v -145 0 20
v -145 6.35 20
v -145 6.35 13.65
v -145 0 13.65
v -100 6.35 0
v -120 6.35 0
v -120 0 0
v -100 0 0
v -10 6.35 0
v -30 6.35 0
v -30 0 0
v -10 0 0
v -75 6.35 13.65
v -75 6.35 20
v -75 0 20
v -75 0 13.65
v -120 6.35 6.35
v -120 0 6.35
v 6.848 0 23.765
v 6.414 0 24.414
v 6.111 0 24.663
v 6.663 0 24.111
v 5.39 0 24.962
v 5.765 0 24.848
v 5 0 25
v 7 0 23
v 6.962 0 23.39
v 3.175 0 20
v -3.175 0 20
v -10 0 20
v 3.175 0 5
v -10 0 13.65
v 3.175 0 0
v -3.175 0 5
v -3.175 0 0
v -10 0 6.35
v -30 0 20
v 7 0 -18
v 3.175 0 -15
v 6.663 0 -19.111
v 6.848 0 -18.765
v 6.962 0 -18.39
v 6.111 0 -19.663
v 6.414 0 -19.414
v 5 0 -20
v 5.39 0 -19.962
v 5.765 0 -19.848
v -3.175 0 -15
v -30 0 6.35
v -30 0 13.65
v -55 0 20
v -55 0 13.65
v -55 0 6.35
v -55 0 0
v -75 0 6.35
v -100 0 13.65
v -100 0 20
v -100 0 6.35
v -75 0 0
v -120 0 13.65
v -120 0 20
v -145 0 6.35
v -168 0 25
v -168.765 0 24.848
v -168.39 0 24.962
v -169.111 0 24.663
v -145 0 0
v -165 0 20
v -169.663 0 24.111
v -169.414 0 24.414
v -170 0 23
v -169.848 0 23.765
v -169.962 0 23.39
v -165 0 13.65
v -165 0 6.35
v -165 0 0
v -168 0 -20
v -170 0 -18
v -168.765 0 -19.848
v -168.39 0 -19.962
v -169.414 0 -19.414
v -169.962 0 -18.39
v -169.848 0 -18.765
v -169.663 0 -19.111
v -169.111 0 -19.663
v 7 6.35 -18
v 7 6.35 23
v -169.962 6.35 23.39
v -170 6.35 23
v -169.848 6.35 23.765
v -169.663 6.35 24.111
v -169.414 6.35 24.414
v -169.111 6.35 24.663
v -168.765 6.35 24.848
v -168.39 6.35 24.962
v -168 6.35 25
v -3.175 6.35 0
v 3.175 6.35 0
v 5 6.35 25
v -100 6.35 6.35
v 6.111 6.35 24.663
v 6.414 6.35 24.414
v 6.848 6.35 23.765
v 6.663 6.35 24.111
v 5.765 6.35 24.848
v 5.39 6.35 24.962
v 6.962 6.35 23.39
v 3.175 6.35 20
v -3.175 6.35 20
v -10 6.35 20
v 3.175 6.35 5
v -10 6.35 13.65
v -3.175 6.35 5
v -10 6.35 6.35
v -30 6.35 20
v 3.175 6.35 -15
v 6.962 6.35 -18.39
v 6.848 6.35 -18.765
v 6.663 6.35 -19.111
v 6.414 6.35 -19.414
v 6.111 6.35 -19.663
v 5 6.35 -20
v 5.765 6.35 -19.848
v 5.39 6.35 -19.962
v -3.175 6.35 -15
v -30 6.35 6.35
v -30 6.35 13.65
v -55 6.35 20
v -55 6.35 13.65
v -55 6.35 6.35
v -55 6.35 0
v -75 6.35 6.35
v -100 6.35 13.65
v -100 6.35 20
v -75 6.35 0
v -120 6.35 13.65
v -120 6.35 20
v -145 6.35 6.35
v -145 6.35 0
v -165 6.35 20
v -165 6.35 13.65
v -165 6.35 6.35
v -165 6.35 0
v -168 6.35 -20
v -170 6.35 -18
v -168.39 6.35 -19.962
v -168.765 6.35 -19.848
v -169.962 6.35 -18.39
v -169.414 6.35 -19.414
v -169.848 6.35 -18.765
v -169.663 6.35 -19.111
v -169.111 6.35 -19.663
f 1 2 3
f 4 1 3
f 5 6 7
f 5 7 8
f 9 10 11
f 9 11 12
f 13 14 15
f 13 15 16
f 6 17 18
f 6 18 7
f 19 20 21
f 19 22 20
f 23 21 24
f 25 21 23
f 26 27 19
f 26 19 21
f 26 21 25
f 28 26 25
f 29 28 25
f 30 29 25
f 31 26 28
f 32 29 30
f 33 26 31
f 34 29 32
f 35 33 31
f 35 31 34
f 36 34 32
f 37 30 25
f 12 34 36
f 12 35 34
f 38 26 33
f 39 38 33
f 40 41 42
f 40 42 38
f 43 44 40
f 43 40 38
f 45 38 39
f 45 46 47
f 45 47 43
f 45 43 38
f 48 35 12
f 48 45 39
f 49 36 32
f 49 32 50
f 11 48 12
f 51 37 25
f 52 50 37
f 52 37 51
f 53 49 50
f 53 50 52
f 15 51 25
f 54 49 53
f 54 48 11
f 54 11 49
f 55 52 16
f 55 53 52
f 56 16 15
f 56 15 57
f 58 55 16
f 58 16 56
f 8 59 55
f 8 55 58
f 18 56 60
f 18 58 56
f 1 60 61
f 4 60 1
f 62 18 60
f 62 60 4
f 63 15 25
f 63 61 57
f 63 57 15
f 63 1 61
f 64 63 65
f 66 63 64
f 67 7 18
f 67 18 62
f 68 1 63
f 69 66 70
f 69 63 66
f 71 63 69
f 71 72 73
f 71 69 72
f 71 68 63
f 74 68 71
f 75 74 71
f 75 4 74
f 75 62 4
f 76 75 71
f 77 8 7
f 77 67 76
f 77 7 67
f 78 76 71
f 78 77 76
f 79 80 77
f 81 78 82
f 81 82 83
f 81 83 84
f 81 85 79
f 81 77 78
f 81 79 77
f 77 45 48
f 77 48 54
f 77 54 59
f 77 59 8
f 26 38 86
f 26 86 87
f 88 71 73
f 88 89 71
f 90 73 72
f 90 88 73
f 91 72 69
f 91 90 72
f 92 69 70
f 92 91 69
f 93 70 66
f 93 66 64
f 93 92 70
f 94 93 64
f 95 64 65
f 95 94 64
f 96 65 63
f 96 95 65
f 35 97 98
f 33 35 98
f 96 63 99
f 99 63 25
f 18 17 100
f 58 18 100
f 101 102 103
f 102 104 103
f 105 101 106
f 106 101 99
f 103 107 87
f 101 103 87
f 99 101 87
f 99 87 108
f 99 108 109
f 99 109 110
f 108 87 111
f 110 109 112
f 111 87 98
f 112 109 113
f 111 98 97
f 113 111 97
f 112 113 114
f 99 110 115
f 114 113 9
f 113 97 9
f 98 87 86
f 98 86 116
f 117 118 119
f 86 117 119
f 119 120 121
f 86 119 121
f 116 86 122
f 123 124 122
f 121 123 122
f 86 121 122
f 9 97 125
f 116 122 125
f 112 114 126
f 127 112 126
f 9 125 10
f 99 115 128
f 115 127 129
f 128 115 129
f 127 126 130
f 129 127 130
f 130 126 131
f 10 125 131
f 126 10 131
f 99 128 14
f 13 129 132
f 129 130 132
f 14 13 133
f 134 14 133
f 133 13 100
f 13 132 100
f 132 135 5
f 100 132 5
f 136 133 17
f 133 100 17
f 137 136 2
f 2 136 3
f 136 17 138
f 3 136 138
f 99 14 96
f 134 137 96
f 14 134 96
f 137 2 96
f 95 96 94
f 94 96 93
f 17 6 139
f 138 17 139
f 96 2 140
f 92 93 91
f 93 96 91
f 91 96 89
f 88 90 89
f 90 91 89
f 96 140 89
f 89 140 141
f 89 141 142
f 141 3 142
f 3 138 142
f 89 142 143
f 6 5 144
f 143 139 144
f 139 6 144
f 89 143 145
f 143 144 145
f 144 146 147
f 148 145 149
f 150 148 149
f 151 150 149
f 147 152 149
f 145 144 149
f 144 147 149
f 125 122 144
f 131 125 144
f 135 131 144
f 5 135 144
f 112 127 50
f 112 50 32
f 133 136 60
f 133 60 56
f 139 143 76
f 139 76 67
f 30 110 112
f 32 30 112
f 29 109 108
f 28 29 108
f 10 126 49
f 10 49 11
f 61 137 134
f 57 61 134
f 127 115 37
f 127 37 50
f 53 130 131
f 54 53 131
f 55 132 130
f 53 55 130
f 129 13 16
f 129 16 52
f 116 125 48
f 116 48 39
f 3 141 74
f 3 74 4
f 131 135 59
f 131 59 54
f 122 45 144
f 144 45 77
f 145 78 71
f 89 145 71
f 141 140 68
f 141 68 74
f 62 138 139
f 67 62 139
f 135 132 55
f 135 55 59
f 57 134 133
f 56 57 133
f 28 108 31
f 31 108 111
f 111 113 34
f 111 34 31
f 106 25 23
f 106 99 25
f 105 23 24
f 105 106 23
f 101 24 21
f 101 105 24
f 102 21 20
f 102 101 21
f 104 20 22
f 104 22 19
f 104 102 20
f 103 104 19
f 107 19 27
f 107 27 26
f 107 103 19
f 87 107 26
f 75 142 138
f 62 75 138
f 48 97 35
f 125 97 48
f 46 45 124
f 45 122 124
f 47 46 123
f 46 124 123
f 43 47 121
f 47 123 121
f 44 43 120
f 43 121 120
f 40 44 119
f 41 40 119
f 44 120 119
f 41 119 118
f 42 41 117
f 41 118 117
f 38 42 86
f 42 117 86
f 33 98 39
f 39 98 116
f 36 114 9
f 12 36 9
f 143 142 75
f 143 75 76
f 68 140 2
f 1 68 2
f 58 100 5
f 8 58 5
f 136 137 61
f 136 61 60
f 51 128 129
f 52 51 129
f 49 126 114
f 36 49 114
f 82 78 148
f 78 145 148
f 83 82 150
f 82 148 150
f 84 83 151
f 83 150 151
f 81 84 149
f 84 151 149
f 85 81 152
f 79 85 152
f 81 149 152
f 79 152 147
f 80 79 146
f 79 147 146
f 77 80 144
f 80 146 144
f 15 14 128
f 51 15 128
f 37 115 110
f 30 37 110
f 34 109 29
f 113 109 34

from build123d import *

# Parameters (mm, degrees)
BOSS_EXTRUDE1_DEPTH = 6.35
SKETCH2_W           = 20
SKETCH2_H           = 6.35
CUT_EXTRUDE1_DEPTH  = 172.94569637
SKETCH4_W           = 6.35
SKETCH4_H           = 15
CUT_EXTRUDE2_DEPTH  = 172.94569637
FILLET1_R           = 2


with BuildPart() as part:
    # Sketch1 → Boss-Extrude1 (new body)
    with BuildSketch(Plane(origin=(0, 0, 0), x_dir=(1, 0, 0), z_dir=(0, 1, 0))):
        Polygon((-170, 0), (-170, 20), (0, 20), (7, 20), (7, -25), (0, -25), (-170, -25), align=None)
    extrude(amount=BOSS_EXTRUDE1_DEPTH)

    # Sketch2 → Cut-Extrude1 (cut, through all)
    with BuildSketch(Plane(origin=(0, 6.35, 0), x_dir=(1, 0, 0), z_dir=(0, 1, 0))):
        with Locations((-110, -16.825)):
            Rectangle(SKETCH2_W, SKETCH2_H)
        with Locations((-155, -16.825)):
            Rectangle(SKETCH2_W, SKETCH2_H)
        with Locations((-65, -16.825)):
            Rectangle(SKETCH2_W, SKETCH2_H)
        with Locations((-20, -16.825)):
            Rectangle(SKETCH2_W, SKETCH2_H)
        with Locations((-110, -3.175)):
            Rectangle(SKETCH2_W, SKETCH2_H)
        with Locations((-155, -3.175)):
            Rectangle(SKETCH2_W, SKETCH2_H)
        with Locations((-65, -3.175)):
            Rectangle(SKETCH2_W, SKETCH2_H)
        with Locations((-20, -3.175)):
            Rectangle(SKETCH2_W, SKETCH2_H)
    extrude(amount=-CUT_EXTRUDE1_DEPTH, mode=Mode.SUBTRACT)

    # Sketch4 → Cut-Extrude2 (cut, through all)
    with BuildSketch(Plane(origin=(0, 6.35, 0), x_dir=(1, 0, 0), z_dir=(0, 1, 0))):
        with Locations((0, -12.5)):
            Rectangle(SKETCH4_W, SKETCH4_H)
        with Locations((0, 7.5)):
            Rectangle(SKETCH4_W, SKETCH4_H)
    extrude(amount=-CUT_EXTRUDE2_DEPTH, mode=Mode.SUBTRACT)

    # Fillet1
    fillet1_edges = [part.edges().sort_by_distance(p)[0] for p in [
        (7, 3.175, -20),
        (7, 3.175, 25),
        (-170, 3.175, 25),
        (-170, 3.175, -20),
    ]]
    fillet(fillet1_edges, radius=FILLET1_R)


solid = part.part
